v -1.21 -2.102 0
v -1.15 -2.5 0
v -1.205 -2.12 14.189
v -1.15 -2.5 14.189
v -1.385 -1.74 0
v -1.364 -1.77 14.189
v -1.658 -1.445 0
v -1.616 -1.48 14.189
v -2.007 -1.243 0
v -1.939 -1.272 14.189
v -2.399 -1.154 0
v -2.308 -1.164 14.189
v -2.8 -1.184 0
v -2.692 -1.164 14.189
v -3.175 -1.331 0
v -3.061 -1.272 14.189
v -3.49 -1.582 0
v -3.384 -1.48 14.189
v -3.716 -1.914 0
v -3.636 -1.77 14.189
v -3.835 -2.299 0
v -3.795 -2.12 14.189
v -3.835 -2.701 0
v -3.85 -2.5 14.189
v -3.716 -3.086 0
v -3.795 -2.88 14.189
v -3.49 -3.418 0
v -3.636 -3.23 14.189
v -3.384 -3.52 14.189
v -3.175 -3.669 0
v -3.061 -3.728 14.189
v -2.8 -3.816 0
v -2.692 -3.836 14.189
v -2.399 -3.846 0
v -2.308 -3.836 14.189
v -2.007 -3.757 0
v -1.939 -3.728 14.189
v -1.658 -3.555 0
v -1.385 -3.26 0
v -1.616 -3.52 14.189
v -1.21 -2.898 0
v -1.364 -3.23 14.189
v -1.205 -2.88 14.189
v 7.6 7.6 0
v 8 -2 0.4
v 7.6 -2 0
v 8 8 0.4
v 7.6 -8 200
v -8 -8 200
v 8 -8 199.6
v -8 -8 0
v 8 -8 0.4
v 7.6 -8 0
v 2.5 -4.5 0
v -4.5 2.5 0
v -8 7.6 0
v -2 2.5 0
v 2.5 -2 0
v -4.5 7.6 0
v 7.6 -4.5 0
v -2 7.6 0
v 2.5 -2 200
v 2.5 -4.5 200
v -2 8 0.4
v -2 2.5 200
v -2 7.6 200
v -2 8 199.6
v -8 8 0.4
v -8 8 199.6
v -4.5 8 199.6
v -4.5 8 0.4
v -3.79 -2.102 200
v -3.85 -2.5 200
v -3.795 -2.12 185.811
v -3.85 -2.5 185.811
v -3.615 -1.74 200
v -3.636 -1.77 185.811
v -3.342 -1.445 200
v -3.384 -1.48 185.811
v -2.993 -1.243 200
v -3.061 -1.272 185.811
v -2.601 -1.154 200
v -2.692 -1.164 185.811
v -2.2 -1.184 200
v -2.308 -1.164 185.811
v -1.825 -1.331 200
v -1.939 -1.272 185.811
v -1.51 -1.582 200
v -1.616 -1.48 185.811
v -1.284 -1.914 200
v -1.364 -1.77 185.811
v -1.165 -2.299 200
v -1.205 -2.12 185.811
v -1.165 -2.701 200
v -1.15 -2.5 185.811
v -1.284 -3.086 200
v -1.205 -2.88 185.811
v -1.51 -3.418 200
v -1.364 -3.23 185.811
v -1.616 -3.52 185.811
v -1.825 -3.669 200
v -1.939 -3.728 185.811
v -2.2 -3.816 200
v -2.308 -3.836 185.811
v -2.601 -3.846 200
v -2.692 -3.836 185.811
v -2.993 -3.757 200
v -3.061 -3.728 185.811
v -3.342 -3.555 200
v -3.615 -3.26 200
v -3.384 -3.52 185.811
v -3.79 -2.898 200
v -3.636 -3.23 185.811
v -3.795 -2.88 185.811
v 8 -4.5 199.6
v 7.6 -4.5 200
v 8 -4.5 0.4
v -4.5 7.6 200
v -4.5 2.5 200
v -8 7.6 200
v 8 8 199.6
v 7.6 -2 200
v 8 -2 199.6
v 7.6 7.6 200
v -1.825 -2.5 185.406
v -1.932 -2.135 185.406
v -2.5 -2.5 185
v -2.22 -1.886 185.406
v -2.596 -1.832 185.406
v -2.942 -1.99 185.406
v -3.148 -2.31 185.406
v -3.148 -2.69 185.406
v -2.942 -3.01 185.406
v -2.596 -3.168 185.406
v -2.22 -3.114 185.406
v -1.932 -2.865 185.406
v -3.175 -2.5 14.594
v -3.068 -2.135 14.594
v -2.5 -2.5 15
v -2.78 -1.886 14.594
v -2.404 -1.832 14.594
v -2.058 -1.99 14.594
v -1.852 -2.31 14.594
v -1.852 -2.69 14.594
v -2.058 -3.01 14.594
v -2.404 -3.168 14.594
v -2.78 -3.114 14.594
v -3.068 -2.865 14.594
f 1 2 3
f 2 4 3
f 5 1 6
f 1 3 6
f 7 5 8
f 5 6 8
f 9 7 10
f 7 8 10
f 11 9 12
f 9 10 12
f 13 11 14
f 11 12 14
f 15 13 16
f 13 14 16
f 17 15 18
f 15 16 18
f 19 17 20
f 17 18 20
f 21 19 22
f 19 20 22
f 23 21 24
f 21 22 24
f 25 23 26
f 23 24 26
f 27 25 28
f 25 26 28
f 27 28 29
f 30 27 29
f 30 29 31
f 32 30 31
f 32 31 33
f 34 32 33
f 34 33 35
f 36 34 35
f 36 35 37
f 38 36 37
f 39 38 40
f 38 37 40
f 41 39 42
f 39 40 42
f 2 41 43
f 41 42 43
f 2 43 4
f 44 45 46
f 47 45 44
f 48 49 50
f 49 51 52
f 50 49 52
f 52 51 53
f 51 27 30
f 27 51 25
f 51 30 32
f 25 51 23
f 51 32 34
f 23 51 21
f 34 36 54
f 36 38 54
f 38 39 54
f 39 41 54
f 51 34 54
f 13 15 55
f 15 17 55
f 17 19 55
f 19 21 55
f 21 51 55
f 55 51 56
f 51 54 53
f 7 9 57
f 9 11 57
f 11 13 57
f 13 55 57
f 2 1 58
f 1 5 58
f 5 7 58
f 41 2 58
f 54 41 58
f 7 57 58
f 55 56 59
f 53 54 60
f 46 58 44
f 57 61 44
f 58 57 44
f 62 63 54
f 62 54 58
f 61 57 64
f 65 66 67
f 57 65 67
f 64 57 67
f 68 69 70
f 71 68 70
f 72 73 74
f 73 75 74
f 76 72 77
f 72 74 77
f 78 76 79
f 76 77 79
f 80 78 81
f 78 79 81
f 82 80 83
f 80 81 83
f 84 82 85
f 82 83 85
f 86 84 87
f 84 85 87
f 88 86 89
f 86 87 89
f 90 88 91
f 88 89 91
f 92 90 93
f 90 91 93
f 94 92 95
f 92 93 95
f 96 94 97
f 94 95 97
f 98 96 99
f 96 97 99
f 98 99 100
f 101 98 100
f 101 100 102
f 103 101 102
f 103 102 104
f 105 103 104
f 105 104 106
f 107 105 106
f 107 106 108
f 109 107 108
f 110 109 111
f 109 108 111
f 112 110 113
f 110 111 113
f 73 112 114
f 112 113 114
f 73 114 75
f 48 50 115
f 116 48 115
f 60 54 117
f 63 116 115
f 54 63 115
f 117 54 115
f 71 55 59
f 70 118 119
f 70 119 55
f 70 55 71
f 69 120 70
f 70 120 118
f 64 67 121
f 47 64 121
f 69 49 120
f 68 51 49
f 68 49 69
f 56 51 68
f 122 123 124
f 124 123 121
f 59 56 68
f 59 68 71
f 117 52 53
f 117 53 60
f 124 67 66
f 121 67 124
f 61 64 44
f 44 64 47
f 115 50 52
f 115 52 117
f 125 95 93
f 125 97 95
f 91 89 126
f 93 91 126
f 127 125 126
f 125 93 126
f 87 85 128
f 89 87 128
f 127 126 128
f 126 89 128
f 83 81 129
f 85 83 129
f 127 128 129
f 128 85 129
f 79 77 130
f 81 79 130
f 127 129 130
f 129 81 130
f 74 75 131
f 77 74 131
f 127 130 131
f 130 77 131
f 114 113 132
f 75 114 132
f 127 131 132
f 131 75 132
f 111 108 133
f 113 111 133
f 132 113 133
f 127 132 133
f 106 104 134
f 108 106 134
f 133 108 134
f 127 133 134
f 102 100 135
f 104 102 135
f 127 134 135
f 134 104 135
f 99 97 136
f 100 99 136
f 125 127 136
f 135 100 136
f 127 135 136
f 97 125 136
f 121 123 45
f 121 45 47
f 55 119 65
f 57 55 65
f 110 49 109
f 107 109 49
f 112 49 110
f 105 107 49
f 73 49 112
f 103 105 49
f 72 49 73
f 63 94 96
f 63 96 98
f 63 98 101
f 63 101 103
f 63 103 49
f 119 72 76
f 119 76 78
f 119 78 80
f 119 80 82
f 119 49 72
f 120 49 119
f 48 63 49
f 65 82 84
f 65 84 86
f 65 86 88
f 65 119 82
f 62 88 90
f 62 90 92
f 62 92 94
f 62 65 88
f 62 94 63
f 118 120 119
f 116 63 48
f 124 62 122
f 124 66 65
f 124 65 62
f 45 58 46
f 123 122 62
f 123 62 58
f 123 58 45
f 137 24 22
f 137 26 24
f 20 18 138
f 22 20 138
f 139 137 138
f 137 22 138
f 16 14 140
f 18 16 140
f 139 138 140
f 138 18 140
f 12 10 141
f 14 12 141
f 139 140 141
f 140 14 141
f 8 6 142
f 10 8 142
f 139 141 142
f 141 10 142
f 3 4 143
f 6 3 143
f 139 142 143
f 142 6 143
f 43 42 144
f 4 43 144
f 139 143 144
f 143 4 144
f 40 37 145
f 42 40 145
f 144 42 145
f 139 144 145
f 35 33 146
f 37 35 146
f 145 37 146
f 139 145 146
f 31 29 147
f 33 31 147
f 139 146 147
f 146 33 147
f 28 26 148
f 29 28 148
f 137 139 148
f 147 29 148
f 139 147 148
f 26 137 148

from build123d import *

# Parameters (mm, degrees)
ESQUISSE1_W                      = 16
ESQUISSE1_H                      = 16
BOSS_EXTRU_1_DEPTH               = 200
ESQUISSE2_W                      = 2.5
ESQUISSE2_H                      = 5.5
ESQUISSE2_W_2                    = 5.5
ESQUISSE2_H_2                    = 2.5
ENL_V_MAT_EXTRU_1_DEPTH          = 201.319744409
CHANFREIN1_SIZE                  = 0.4
D_GAGEMENT_M2_51_D               = 2.7
D_GAGEMENT_M2_51_DEPTH           = 14.188838164
D_GAGEMENT_M2_51_TIP             = 0.811161836
D_GAGEMENT_M2_51_ON_FACE_2_D     = 2.7
D_GAGEMENT_M2_51_ON_FACE_2_DEPTH = 14.188838164
D_GAGEMENT_M2_51_ON_FACE_2_TIP   = 0.811161836


with BuildPart() as part:
    # Esquisse1 → Boss.-Extru.1 (new body)
    with BuildSketch(Plane.XY):
        Rectangle(ESQUISSE1_W, ESQUISSE1_H)
    extrude(amount=BOSS_EXTRU_1_DEPTH)

    # Esquisse2 → Enlèv. mat.-Extru.1 (cut, through all)
    with BuildSketch(Plane.XY.offset(200)):
        with Locations((-3.25, 5.25)):
            Rectangle(ESQUISSE2_W, ESQUISSE2_H)
        with Locations((5.25, -3.25)):
            Rectangle(ESQUISSE2_W_2, ESQUISSE2_H_2)
    extrude(amount=-ENL_V_MAT_EXTRU_1_DEPTH, mode=Mode.SUBTRACT)

    # Chanfrein1
    chanfrein1_edges = [part.edges().sort_by_distance(p)[0] for p in [
        (8, 3, 0),
        (-6.25, 8, 0),
        (8, 3, 200),
        (-6.25, 8, 200),
        (8, -6.25, 200),
        (3, 8, 0),
        (8, -6.25, 0),
        (3, 8, 200),
    ]]
    chamfer(chanfrein1_edges, length=CHANFREIN1_SIZE)

    # Dégagement M2.51
    with Locations(Plane(origin=(-2.5, -2.5, 200), x_dir=(1, 0, 0), z_dir=(0, 0, 1))):
        with Locations((0, 0)):
            Hole(D_GAGEMENT_M2_51_D / 2, depth=D_GAGEMENT_M2_51_DEPTH)
            with Locations((0, 0, -(D_GAGEMENT_M2_51_DEPTH + D_GAGEMENT_M2_51_TIP / 2))):  # 118° drill point
                Cone(0, D_GAGEMENT_M2_51_D / 2, D_GAGEMENT_M2_51_TIP, mode=Mode.SUBTRACT)

    # Dégagement M2.51 on face 2
    with Locations(Plane(origin=(-2.5, -2.5, 0), x_dir=(-1, 0, 0), z_dir=(0, 0, -1))):
        with Locations((0, 0)):
            Hole(D_GAGEMENT_M2_51_ON_FACE_2_D / 2, depth=D_GAGEMENT_M2_51_ON_FACE_2_DEPTH)
            with Locations((0, 0, -(D_GAGEMENT_M2_51_ON_FACE_2_DEPTH + D_GAGEMENT_M2_51_ON_FACE_2_TIP / 2))):  # 118° drill point
                Cone(0, D_GAGEMENT_M2_51_ON_FACE_2_D / 2, D_GAGEMENT_M2_51_ON_FACE_2_TIP, mode=Mode.SUBTRACT)


solid = part.part
